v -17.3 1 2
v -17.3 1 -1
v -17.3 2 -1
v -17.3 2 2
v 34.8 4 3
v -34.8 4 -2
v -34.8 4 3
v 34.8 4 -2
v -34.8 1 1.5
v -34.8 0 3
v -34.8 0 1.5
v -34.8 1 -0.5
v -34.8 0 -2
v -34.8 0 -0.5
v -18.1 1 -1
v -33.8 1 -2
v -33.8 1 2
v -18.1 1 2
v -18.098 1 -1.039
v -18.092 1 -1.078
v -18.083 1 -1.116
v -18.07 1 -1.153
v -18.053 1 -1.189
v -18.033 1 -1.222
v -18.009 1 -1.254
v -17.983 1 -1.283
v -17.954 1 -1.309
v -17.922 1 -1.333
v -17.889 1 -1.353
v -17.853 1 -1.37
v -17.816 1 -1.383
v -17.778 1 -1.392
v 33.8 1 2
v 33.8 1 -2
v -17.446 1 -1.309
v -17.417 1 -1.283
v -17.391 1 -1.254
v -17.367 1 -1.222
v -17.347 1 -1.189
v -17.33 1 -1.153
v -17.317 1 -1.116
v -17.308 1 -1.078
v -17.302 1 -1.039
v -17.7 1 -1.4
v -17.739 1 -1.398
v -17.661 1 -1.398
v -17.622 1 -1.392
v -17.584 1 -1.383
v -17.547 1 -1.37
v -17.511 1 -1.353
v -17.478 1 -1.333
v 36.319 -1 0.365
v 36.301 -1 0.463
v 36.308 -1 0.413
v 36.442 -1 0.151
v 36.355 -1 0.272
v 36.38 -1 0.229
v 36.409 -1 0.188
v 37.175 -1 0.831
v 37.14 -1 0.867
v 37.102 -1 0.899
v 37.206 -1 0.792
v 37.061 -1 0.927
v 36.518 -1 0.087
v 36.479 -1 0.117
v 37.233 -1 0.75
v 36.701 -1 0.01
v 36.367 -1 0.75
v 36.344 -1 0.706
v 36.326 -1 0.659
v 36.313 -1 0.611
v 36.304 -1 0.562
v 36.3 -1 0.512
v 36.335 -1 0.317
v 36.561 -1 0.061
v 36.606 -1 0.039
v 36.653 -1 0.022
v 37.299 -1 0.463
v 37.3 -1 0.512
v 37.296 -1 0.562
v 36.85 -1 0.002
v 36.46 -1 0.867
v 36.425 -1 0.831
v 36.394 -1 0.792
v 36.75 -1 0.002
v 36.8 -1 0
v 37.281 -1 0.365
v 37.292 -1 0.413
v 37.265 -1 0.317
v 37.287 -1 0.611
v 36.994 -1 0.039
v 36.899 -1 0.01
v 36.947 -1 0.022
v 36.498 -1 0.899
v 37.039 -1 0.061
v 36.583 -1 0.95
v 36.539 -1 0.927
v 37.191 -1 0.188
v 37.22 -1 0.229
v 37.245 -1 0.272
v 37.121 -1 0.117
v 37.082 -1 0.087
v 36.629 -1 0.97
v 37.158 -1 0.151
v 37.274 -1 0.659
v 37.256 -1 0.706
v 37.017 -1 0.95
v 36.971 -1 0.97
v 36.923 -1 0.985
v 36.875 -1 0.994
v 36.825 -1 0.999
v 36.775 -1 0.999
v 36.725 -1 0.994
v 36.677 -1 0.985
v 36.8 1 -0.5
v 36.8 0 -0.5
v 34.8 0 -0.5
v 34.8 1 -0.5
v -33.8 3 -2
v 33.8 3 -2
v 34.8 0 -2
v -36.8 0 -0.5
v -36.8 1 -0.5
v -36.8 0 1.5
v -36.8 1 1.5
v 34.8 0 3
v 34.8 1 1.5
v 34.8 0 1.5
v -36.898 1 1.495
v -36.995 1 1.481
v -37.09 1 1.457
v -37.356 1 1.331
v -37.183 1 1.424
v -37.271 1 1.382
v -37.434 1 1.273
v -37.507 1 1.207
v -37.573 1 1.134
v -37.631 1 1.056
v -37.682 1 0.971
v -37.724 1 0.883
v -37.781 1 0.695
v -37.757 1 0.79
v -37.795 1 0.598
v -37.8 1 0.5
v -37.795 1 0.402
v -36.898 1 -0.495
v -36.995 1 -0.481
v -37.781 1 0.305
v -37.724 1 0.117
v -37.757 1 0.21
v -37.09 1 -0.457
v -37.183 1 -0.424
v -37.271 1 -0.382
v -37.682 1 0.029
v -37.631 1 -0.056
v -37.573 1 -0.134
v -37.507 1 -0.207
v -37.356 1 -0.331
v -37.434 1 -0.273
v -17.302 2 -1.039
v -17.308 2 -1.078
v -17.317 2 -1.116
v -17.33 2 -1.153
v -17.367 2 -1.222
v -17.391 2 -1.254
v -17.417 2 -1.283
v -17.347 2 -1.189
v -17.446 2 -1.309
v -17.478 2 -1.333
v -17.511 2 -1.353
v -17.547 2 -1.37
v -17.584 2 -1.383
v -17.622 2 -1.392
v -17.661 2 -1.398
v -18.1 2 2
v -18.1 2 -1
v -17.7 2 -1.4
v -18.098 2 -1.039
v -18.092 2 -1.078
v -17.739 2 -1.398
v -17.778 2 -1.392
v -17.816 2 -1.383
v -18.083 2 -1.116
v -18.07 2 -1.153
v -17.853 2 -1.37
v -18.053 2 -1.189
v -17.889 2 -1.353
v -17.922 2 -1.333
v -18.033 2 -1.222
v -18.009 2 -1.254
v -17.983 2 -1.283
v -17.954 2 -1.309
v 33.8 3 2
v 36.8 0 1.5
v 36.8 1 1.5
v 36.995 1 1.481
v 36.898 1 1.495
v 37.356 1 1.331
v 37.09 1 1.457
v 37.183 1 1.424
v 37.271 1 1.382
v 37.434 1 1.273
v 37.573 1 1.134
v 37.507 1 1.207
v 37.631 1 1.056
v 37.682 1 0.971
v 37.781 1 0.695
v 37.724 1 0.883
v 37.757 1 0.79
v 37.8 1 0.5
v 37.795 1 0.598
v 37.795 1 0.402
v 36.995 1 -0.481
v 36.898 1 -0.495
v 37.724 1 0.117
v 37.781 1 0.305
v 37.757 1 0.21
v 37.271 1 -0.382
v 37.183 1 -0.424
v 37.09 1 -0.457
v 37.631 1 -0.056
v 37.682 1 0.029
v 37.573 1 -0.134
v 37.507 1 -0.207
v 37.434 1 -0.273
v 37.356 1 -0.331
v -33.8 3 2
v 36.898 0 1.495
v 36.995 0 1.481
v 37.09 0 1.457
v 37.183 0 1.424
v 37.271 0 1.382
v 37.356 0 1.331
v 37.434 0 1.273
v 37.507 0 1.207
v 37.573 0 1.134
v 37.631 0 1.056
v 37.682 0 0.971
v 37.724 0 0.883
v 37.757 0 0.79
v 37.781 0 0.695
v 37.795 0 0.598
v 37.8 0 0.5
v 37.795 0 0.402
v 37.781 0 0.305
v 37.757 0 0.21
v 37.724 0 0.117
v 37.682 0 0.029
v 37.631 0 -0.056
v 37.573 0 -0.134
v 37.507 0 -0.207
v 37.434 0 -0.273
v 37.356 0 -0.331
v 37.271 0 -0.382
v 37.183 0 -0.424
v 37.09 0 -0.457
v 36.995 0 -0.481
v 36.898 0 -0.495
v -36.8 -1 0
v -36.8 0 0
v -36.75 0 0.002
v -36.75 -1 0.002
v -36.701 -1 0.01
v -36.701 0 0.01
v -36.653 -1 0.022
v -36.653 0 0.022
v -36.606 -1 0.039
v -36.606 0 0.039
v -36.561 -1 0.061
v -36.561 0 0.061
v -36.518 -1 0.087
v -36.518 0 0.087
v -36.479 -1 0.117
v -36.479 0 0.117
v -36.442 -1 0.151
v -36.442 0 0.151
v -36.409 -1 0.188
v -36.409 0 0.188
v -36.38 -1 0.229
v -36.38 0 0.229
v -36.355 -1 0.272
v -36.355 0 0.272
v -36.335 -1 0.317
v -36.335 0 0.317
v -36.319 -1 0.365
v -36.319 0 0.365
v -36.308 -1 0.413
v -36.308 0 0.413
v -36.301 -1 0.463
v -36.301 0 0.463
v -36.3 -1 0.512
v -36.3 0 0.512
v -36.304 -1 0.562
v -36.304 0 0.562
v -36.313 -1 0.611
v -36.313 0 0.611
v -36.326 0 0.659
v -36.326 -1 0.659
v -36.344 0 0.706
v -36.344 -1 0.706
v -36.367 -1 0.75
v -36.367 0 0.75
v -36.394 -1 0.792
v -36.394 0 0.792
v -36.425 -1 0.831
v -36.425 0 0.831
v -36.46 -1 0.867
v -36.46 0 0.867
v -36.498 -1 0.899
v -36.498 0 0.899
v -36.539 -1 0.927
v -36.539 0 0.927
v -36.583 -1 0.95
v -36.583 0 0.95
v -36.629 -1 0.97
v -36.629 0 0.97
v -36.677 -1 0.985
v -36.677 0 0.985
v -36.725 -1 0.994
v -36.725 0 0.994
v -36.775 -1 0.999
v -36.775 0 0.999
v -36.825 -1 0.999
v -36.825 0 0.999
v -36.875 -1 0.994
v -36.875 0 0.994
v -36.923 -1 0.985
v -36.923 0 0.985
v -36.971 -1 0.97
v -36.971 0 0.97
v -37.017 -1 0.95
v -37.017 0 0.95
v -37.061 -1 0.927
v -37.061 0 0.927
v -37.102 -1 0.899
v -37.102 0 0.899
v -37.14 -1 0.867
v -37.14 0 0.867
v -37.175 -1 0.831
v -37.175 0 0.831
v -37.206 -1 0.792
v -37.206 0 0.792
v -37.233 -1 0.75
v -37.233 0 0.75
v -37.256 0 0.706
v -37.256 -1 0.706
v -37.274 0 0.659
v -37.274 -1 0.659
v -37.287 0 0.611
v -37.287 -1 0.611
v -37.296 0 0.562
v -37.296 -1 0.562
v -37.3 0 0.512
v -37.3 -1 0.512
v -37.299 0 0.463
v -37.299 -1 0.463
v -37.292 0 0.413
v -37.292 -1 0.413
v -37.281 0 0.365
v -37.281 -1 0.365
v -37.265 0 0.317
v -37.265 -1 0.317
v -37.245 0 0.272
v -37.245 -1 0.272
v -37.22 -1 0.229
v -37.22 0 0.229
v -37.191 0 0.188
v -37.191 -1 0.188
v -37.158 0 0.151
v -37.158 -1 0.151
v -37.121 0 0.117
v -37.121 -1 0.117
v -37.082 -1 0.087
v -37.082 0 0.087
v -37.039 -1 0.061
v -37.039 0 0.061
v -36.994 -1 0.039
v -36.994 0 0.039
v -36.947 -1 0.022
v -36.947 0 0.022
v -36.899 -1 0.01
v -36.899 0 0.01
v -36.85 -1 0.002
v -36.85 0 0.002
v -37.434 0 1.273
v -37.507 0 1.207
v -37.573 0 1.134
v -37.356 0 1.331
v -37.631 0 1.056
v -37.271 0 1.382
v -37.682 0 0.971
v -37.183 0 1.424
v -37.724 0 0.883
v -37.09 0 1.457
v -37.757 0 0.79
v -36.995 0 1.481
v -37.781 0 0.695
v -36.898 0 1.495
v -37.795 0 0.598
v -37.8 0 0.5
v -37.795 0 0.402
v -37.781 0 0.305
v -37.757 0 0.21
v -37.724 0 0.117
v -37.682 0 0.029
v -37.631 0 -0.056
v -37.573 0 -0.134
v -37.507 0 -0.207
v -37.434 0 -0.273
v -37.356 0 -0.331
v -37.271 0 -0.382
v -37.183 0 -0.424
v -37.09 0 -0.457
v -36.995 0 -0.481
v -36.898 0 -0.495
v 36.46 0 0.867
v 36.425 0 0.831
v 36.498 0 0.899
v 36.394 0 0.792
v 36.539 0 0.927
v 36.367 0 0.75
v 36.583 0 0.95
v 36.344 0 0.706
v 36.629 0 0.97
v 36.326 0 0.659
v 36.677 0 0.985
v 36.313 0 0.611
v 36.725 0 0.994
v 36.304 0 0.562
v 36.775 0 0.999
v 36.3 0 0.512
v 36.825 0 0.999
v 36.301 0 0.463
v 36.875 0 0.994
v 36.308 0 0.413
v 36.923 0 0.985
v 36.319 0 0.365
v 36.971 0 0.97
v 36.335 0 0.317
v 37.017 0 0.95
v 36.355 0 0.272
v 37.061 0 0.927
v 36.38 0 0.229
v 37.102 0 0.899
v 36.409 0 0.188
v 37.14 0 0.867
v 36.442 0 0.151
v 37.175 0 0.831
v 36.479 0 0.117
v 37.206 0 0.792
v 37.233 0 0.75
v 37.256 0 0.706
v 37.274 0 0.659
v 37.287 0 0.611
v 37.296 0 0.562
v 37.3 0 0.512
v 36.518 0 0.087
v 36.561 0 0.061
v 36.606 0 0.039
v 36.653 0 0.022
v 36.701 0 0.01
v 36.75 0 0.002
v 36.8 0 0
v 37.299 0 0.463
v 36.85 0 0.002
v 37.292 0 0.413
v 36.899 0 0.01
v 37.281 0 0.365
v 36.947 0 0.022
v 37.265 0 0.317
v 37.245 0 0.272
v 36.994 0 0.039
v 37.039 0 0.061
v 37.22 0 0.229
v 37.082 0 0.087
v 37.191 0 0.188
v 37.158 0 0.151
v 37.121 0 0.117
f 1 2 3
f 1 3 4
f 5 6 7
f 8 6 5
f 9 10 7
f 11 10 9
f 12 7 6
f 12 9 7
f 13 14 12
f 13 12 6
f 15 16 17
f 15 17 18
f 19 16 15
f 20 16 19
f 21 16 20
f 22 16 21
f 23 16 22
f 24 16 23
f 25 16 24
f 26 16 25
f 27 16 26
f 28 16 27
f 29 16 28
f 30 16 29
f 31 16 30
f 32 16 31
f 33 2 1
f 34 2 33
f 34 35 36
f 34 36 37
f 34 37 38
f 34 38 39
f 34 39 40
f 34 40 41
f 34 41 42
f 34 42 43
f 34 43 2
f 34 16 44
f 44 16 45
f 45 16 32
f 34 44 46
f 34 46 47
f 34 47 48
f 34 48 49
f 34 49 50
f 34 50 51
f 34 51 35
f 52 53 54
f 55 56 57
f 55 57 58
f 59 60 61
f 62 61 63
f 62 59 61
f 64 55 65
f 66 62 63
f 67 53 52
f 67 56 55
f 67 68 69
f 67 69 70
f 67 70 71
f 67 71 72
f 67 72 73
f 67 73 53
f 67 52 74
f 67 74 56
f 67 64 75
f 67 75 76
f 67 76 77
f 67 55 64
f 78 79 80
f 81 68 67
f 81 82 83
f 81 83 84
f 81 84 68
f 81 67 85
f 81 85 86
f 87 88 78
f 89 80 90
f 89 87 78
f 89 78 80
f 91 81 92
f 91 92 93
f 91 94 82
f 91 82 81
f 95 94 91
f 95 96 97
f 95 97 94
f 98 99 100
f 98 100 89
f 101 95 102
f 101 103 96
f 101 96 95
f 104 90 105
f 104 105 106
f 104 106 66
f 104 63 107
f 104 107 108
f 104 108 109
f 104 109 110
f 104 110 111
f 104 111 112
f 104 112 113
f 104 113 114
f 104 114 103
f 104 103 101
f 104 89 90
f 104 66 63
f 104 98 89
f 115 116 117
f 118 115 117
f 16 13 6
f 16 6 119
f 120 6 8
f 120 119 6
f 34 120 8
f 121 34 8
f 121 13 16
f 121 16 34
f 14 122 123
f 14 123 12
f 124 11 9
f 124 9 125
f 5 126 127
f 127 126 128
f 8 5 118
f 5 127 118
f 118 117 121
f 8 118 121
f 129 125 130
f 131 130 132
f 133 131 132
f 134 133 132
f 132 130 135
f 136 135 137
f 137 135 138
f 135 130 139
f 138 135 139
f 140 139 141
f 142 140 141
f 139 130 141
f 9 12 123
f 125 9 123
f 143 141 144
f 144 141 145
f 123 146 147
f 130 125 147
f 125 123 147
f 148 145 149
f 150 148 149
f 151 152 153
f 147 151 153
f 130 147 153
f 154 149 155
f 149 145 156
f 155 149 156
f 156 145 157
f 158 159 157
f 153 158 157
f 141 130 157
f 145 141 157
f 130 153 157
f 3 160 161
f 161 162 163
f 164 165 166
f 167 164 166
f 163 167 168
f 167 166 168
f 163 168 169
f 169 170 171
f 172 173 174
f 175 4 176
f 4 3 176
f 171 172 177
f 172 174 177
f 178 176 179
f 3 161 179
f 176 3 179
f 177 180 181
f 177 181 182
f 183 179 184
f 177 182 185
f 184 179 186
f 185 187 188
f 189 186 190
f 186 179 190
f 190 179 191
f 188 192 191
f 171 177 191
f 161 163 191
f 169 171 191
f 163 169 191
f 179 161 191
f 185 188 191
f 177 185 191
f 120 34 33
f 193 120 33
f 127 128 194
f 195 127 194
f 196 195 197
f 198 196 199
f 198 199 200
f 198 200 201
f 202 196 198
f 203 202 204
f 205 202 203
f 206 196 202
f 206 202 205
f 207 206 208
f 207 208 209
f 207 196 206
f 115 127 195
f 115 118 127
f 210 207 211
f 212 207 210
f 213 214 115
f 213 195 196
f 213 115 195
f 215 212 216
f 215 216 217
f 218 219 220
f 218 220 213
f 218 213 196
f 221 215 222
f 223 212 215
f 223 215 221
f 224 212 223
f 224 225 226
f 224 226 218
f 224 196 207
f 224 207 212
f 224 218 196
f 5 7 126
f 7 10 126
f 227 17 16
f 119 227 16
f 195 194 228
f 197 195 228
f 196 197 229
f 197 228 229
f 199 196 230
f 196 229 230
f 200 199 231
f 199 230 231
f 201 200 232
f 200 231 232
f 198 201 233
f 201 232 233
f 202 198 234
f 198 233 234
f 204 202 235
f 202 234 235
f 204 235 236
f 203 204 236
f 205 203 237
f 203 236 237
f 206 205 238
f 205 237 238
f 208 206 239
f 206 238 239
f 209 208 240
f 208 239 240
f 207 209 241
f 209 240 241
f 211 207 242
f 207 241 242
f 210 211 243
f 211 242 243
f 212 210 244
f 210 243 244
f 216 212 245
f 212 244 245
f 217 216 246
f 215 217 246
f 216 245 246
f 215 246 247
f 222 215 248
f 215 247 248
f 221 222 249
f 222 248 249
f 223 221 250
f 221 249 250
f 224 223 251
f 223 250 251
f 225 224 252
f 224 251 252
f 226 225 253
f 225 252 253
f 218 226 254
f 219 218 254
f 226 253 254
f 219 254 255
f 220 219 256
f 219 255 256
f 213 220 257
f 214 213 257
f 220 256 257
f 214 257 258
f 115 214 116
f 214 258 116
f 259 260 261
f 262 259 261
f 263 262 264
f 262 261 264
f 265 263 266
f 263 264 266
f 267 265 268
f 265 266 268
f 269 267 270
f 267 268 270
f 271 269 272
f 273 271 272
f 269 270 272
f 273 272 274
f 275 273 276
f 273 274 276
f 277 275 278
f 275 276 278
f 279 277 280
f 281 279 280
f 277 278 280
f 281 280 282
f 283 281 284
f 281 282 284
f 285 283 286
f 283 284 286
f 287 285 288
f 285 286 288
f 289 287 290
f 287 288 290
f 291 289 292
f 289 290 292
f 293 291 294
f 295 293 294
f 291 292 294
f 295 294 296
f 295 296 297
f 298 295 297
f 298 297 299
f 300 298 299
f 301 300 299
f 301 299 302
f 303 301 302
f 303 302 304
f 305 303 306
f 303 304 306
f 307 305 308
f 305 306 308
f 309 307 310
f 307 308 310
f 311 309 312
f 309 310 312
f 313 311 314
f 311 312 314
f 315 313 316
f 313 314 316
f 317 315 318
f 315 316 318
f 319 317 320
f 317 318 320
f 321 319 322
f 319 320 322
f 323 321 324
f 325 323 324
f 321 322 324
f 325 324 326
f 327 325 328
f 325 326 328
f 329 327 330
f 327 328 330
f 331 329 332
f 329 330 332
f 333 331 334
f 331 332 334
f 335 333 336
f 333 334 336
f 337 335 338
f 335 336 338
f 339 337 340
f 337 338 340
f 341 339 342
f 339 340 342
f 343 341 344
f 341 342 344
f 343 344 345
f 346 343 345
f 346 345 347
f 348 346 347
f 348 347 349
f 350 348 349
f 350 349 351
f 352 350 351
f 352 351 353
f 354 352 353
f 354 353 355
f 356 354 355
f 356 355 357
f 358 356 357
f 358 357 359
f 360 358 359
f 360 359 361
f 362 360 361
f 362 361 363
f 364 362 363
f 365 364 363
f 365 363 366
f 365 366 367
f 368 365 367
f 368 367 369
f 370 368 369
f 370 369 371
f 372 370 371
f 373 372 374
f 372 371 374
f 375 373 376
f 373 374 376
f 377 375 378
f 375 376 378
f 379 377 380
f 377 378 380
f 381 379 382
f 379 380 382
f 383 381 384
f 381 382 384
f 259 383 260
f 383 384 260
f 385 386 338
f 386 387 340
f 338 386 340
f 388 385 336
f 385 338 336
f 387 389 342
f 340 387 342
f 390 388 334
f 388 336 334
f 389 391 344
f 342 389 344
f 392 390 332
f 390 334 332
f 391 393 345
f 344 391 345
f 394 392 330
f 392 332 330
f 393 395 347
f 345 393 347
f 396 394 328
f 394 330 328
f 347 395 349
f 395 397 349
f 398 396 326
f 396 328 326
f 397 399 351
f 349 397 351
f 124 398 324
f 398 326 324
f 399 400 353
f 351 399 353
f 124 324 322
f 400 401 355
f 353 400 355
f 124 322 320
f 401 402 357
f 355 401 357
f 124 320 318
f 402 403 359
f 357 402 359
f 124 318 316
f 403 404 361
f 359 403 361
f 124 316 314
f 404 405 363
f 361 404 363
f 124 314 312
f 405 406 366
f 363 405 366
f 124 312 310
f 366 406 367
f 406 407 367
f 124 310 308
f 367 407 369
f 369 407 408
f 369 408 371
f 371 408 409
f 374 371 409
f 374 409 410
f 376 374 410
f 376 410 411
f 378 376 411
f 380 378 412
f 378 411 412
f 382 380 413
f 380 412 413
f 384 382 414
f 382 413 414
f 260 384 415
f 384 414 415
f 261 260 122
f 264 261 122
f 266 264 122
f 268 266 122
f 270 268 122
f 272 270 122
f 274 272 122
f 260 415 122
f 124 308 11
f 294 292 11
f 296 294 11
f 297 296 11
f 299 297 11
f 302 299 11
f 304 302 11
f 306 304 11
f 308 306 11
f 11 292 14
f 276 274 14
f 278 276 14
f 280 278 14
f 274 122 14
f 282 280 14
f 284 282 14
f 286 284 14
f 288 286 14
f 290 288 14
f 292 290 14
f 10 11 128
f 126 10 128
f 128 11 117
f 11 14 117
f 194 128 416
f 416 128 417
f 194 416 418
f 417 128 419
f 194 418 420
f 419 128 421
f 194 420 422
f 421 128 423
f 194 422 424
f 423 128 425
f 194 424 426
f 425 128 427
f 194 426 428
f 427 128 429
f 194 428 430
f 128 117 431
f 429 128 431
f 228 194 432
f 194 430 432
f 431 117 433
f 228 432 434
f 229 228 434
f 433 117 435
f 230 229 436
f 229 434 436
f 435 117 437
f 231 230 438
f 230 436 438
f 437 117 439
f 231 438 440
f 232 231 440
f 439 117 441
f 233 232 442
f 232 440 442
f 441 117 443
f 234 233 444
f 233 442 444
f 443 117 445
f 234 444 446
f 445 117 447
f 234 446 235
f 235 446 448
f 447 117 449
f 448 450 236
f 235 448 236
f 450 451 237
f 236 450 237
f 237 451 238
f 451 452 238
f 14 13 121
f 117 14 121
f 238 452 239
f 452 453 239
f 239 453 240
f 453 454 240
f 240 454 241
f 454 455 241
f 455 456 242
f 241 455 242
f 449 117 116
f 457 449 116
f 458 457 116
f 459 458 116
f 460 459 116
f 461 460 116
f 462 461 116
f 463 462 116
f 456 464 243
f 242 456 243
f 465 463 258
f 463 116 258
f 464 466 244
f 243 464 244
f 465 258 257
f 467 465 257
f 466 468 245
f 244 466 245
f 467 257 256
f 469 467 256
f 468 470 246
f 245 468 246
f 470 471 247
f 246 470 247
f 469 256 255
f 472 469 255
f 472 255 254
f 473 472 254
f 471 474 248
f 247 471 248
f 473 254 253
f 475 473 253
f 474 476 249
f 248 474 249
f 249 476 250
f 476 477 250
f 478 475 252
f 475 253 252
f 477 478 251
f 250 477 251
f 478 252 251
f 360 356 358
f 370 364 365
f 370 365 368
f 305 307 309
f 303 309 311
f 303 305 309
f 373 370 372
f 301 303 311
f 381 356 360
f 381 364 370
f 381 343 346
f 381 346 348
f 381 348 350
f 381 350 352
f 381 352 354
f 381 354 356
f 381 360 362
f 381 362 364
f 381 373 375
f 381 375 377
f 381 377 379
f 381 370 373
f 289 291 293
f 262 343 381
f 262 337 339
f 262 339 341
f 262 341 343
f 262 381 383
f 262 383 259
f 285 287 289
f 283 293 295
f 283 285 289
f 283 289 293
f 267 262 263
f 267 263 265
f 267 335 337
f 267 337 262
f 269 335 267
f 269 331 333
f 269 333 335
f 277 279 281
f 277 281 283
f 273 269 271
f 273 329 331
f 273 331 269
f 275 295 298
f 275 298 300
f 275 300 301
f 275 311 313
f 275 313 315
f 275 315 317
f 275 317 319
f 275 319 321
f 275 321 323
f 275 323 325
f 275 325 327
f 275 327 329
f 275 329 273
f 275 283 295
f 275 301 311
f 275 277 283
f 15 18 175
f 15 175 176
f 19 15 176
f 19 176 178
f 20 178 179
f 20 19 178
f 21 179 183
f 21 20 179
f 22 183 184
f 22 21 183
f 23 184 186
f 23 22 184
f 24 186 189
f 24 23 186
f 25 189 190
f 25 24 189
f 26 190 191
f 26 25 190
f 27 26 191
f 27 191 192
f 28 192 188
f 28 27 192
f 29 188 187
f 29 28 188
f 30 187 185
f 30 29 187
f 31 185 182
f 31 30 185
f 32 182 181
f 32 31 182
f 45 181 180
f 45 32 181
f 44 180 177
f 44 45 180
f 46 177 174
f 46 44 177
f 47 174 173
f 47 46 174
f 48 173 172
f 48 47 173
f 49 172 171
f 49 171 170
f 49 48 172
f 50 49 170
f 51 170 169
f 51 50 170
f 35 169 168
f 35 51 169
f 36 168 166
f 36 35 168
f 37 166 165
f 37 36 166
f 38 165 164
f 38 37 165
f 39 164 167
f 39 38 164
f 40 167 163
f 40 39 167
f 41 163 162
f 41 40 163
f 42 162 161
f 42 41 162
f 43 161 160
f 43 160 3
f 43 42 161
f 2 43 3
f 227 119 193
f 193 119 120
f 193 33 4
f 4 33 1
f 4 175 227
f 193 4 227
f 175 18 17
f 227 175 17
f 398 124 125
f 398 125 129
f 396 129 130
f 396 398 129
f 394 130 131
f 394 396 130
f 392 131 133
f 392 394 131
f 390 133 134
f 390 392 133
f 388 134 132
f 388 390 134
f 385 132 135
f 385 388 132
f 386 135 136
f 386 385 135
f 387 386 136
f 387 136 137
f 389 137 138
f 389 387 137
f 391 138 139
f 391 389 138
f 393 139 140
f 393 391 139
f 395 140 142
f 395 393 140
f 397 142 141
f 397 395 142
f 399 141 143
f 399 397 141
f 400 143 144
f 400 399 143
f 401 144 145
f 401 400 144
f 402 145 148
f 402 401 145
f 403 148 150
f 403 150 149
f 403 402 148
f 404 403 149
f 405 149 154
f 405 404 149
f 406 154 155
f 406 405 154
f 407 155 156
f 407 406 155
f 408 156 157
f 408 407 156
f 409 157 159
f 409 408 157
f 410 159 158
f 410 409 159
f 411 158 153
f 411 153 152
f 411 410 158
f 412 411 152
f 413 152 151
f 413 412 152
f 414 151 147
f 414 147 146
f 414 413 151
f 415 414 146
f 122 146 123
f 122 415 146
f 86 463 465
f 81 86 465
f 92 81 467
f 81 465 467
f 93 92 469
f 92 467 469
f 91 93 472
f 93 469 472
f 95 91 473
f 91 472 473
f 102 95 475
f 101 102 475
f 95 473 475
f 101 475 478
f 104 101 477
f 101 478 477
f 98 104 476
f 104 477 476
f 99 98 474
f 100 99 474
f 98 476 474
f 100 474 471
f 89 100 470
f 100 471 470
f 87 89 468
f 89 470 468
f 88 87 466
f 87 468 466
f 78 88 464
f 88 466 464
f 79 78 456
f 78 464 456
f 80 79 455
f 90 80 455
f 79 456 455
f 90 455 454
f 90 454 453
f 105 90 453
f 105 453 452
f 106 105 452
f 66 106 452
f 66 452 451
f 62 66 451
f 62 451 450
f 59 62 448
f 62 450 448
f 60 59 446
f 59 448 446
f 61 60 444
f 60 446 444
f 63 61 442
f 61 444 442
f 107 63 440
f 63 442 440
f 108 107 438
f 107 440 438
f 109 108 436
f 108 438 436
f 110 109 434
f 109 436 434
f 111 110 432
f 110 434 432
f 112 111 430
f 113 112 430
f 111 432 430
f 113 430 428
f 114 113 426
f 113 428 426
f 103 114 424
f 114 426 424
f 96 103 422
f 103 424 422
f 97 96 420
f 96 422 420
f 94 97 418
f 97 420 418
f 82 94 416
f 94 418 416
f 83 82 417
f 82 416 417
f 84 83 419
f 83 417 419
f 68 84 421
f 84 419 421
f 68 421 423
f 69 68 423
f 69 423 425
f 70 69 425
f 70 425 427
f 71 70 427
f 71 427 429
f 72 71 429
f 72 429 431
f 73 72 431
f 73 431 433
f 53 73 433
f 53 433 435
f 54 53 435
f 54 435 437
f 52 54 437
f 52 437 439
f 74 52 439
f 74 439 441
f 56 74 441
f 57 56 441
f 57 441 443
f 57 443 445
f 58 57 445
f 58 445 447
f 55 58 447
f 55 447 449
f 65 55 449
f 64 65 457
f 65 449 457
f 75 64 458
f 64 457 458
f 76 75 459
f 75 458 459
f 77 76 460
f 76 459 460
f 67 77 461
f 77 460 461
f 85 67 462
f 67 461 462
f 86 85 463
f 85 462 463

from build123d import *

# Parameters (mm, degrees)
SKETCH1_W           = 67.6
SKETCH1_H           = 4
BASE_DEPTH          = 1
NOCK_DEPTH          = 1
WALLS_DEPTH         = 3
SKETCH4_W           = 69.6
SKETCH4_H           = 5
TOP_DEPTH           = 1
MOUNTINGTABS_DEPTH  = 1
SKETCH6_R           = 0.5
BOSS_EXTRUDE7_DEPTH = 1


with BuildPart() as part:
    # Sketch1 → Base (new body)
    with BuildSketch(Plane(origin=(0, 0, 0), x_dir=(1, 0, 0), z_dir=(0, 1, 0))):
        Rectangle(SKETCH1_W, SKETCH1_H)
    extrude(amount=BASE_DEPTH)

    # Sketch2 → nock (add)
    with BuildSketch(Plane(origin=(0, 1, 0), x_dir=(1, 0, 0), z_dir=(0, 1, 0))):
        with BuildLine():
            Line((-18.1, -2.5), (-18.1, 1))
            ThreePointArc((-18.1, 1), (-17.7, 1.4), (-17.3, 1))
            Line((-17.3, 1), (-17.3, -2.5))
            Line((-17.3, -2.5), (-18.1, -2.5))
        make_face()
    extrude(amount=NOCK_DEPTH)

    # Sketch3 → Walls (add)
    with BuildSketch(Plane(origin=(0, 0, 0), x_dir=(1, 0, 0), z_dir=(0, 1, 0))):
        Polygon((-33.8, 2), (-34.8, 2), (-34.8, -3), (34.8, -3), (34.8, 2), (33.8, 2), (33.8, -2), (-33.8, -2), align=None)
    extrude(amount=WALLS_DEPTH)

    # Sketch4 → Top (add)
    with BuildSketch(Plane(origin=(0, 3, 0), x_dir=(1, 0, 0), z_dir=(0, 1, 0))):
        with Locations((0, -0.5)):
            Rectangle(SKETCH4_W, SKETCH4_H)
    extrude(amount=TOP_DEPTH)

    # Sketch5 → MountingTabs (add)
    with BuildSketch(Plane(origin=(0, 0, 0), x_dir=(1, 0, 0), z_dir=(0, 1, 0))):
        with BuildLine():
            Line((-34.8, 0.5), (-34.8, -1.5))
            Line((-34.8, -1.5), (-36.8, -1.5))
            ThreePointArc((-36.8, -1.5), (-37.8, -0.5), (-36.8, 0.5))
            Line((-36.8, 0.5), (-34.8, 0.5))
        make_face()
        with BuildLine():
            Line((34.8, -1.5), (36.8, -1.5))
            ThreePointArc((36.8, -1.5), (37.8, -0.5), (36.8, 0.5))
            Line((36.8, 0.5), (34.8, 0.5))
            Line((34.8, 0.5), (34.8, -1.5))
        make_face()
    extrude(amount=MOUNTINGTABS_DEPTH)

    # Sketch6 → Boss-Extrude7 (add)
    with BuildSketch(Plane.XZ):
        with Locations(Location((-36.8, 0.5, 0), (0, 0, 270))):
            Circle(SKETCH6_R)
        with Locations(Location((36.8, 0.5, 0), (0, 0, 270))):
            Circle(SKETCH6_R)
    extrude(amount=BOSS_EXTRUDE7_DEPTH)


solid = part.part
